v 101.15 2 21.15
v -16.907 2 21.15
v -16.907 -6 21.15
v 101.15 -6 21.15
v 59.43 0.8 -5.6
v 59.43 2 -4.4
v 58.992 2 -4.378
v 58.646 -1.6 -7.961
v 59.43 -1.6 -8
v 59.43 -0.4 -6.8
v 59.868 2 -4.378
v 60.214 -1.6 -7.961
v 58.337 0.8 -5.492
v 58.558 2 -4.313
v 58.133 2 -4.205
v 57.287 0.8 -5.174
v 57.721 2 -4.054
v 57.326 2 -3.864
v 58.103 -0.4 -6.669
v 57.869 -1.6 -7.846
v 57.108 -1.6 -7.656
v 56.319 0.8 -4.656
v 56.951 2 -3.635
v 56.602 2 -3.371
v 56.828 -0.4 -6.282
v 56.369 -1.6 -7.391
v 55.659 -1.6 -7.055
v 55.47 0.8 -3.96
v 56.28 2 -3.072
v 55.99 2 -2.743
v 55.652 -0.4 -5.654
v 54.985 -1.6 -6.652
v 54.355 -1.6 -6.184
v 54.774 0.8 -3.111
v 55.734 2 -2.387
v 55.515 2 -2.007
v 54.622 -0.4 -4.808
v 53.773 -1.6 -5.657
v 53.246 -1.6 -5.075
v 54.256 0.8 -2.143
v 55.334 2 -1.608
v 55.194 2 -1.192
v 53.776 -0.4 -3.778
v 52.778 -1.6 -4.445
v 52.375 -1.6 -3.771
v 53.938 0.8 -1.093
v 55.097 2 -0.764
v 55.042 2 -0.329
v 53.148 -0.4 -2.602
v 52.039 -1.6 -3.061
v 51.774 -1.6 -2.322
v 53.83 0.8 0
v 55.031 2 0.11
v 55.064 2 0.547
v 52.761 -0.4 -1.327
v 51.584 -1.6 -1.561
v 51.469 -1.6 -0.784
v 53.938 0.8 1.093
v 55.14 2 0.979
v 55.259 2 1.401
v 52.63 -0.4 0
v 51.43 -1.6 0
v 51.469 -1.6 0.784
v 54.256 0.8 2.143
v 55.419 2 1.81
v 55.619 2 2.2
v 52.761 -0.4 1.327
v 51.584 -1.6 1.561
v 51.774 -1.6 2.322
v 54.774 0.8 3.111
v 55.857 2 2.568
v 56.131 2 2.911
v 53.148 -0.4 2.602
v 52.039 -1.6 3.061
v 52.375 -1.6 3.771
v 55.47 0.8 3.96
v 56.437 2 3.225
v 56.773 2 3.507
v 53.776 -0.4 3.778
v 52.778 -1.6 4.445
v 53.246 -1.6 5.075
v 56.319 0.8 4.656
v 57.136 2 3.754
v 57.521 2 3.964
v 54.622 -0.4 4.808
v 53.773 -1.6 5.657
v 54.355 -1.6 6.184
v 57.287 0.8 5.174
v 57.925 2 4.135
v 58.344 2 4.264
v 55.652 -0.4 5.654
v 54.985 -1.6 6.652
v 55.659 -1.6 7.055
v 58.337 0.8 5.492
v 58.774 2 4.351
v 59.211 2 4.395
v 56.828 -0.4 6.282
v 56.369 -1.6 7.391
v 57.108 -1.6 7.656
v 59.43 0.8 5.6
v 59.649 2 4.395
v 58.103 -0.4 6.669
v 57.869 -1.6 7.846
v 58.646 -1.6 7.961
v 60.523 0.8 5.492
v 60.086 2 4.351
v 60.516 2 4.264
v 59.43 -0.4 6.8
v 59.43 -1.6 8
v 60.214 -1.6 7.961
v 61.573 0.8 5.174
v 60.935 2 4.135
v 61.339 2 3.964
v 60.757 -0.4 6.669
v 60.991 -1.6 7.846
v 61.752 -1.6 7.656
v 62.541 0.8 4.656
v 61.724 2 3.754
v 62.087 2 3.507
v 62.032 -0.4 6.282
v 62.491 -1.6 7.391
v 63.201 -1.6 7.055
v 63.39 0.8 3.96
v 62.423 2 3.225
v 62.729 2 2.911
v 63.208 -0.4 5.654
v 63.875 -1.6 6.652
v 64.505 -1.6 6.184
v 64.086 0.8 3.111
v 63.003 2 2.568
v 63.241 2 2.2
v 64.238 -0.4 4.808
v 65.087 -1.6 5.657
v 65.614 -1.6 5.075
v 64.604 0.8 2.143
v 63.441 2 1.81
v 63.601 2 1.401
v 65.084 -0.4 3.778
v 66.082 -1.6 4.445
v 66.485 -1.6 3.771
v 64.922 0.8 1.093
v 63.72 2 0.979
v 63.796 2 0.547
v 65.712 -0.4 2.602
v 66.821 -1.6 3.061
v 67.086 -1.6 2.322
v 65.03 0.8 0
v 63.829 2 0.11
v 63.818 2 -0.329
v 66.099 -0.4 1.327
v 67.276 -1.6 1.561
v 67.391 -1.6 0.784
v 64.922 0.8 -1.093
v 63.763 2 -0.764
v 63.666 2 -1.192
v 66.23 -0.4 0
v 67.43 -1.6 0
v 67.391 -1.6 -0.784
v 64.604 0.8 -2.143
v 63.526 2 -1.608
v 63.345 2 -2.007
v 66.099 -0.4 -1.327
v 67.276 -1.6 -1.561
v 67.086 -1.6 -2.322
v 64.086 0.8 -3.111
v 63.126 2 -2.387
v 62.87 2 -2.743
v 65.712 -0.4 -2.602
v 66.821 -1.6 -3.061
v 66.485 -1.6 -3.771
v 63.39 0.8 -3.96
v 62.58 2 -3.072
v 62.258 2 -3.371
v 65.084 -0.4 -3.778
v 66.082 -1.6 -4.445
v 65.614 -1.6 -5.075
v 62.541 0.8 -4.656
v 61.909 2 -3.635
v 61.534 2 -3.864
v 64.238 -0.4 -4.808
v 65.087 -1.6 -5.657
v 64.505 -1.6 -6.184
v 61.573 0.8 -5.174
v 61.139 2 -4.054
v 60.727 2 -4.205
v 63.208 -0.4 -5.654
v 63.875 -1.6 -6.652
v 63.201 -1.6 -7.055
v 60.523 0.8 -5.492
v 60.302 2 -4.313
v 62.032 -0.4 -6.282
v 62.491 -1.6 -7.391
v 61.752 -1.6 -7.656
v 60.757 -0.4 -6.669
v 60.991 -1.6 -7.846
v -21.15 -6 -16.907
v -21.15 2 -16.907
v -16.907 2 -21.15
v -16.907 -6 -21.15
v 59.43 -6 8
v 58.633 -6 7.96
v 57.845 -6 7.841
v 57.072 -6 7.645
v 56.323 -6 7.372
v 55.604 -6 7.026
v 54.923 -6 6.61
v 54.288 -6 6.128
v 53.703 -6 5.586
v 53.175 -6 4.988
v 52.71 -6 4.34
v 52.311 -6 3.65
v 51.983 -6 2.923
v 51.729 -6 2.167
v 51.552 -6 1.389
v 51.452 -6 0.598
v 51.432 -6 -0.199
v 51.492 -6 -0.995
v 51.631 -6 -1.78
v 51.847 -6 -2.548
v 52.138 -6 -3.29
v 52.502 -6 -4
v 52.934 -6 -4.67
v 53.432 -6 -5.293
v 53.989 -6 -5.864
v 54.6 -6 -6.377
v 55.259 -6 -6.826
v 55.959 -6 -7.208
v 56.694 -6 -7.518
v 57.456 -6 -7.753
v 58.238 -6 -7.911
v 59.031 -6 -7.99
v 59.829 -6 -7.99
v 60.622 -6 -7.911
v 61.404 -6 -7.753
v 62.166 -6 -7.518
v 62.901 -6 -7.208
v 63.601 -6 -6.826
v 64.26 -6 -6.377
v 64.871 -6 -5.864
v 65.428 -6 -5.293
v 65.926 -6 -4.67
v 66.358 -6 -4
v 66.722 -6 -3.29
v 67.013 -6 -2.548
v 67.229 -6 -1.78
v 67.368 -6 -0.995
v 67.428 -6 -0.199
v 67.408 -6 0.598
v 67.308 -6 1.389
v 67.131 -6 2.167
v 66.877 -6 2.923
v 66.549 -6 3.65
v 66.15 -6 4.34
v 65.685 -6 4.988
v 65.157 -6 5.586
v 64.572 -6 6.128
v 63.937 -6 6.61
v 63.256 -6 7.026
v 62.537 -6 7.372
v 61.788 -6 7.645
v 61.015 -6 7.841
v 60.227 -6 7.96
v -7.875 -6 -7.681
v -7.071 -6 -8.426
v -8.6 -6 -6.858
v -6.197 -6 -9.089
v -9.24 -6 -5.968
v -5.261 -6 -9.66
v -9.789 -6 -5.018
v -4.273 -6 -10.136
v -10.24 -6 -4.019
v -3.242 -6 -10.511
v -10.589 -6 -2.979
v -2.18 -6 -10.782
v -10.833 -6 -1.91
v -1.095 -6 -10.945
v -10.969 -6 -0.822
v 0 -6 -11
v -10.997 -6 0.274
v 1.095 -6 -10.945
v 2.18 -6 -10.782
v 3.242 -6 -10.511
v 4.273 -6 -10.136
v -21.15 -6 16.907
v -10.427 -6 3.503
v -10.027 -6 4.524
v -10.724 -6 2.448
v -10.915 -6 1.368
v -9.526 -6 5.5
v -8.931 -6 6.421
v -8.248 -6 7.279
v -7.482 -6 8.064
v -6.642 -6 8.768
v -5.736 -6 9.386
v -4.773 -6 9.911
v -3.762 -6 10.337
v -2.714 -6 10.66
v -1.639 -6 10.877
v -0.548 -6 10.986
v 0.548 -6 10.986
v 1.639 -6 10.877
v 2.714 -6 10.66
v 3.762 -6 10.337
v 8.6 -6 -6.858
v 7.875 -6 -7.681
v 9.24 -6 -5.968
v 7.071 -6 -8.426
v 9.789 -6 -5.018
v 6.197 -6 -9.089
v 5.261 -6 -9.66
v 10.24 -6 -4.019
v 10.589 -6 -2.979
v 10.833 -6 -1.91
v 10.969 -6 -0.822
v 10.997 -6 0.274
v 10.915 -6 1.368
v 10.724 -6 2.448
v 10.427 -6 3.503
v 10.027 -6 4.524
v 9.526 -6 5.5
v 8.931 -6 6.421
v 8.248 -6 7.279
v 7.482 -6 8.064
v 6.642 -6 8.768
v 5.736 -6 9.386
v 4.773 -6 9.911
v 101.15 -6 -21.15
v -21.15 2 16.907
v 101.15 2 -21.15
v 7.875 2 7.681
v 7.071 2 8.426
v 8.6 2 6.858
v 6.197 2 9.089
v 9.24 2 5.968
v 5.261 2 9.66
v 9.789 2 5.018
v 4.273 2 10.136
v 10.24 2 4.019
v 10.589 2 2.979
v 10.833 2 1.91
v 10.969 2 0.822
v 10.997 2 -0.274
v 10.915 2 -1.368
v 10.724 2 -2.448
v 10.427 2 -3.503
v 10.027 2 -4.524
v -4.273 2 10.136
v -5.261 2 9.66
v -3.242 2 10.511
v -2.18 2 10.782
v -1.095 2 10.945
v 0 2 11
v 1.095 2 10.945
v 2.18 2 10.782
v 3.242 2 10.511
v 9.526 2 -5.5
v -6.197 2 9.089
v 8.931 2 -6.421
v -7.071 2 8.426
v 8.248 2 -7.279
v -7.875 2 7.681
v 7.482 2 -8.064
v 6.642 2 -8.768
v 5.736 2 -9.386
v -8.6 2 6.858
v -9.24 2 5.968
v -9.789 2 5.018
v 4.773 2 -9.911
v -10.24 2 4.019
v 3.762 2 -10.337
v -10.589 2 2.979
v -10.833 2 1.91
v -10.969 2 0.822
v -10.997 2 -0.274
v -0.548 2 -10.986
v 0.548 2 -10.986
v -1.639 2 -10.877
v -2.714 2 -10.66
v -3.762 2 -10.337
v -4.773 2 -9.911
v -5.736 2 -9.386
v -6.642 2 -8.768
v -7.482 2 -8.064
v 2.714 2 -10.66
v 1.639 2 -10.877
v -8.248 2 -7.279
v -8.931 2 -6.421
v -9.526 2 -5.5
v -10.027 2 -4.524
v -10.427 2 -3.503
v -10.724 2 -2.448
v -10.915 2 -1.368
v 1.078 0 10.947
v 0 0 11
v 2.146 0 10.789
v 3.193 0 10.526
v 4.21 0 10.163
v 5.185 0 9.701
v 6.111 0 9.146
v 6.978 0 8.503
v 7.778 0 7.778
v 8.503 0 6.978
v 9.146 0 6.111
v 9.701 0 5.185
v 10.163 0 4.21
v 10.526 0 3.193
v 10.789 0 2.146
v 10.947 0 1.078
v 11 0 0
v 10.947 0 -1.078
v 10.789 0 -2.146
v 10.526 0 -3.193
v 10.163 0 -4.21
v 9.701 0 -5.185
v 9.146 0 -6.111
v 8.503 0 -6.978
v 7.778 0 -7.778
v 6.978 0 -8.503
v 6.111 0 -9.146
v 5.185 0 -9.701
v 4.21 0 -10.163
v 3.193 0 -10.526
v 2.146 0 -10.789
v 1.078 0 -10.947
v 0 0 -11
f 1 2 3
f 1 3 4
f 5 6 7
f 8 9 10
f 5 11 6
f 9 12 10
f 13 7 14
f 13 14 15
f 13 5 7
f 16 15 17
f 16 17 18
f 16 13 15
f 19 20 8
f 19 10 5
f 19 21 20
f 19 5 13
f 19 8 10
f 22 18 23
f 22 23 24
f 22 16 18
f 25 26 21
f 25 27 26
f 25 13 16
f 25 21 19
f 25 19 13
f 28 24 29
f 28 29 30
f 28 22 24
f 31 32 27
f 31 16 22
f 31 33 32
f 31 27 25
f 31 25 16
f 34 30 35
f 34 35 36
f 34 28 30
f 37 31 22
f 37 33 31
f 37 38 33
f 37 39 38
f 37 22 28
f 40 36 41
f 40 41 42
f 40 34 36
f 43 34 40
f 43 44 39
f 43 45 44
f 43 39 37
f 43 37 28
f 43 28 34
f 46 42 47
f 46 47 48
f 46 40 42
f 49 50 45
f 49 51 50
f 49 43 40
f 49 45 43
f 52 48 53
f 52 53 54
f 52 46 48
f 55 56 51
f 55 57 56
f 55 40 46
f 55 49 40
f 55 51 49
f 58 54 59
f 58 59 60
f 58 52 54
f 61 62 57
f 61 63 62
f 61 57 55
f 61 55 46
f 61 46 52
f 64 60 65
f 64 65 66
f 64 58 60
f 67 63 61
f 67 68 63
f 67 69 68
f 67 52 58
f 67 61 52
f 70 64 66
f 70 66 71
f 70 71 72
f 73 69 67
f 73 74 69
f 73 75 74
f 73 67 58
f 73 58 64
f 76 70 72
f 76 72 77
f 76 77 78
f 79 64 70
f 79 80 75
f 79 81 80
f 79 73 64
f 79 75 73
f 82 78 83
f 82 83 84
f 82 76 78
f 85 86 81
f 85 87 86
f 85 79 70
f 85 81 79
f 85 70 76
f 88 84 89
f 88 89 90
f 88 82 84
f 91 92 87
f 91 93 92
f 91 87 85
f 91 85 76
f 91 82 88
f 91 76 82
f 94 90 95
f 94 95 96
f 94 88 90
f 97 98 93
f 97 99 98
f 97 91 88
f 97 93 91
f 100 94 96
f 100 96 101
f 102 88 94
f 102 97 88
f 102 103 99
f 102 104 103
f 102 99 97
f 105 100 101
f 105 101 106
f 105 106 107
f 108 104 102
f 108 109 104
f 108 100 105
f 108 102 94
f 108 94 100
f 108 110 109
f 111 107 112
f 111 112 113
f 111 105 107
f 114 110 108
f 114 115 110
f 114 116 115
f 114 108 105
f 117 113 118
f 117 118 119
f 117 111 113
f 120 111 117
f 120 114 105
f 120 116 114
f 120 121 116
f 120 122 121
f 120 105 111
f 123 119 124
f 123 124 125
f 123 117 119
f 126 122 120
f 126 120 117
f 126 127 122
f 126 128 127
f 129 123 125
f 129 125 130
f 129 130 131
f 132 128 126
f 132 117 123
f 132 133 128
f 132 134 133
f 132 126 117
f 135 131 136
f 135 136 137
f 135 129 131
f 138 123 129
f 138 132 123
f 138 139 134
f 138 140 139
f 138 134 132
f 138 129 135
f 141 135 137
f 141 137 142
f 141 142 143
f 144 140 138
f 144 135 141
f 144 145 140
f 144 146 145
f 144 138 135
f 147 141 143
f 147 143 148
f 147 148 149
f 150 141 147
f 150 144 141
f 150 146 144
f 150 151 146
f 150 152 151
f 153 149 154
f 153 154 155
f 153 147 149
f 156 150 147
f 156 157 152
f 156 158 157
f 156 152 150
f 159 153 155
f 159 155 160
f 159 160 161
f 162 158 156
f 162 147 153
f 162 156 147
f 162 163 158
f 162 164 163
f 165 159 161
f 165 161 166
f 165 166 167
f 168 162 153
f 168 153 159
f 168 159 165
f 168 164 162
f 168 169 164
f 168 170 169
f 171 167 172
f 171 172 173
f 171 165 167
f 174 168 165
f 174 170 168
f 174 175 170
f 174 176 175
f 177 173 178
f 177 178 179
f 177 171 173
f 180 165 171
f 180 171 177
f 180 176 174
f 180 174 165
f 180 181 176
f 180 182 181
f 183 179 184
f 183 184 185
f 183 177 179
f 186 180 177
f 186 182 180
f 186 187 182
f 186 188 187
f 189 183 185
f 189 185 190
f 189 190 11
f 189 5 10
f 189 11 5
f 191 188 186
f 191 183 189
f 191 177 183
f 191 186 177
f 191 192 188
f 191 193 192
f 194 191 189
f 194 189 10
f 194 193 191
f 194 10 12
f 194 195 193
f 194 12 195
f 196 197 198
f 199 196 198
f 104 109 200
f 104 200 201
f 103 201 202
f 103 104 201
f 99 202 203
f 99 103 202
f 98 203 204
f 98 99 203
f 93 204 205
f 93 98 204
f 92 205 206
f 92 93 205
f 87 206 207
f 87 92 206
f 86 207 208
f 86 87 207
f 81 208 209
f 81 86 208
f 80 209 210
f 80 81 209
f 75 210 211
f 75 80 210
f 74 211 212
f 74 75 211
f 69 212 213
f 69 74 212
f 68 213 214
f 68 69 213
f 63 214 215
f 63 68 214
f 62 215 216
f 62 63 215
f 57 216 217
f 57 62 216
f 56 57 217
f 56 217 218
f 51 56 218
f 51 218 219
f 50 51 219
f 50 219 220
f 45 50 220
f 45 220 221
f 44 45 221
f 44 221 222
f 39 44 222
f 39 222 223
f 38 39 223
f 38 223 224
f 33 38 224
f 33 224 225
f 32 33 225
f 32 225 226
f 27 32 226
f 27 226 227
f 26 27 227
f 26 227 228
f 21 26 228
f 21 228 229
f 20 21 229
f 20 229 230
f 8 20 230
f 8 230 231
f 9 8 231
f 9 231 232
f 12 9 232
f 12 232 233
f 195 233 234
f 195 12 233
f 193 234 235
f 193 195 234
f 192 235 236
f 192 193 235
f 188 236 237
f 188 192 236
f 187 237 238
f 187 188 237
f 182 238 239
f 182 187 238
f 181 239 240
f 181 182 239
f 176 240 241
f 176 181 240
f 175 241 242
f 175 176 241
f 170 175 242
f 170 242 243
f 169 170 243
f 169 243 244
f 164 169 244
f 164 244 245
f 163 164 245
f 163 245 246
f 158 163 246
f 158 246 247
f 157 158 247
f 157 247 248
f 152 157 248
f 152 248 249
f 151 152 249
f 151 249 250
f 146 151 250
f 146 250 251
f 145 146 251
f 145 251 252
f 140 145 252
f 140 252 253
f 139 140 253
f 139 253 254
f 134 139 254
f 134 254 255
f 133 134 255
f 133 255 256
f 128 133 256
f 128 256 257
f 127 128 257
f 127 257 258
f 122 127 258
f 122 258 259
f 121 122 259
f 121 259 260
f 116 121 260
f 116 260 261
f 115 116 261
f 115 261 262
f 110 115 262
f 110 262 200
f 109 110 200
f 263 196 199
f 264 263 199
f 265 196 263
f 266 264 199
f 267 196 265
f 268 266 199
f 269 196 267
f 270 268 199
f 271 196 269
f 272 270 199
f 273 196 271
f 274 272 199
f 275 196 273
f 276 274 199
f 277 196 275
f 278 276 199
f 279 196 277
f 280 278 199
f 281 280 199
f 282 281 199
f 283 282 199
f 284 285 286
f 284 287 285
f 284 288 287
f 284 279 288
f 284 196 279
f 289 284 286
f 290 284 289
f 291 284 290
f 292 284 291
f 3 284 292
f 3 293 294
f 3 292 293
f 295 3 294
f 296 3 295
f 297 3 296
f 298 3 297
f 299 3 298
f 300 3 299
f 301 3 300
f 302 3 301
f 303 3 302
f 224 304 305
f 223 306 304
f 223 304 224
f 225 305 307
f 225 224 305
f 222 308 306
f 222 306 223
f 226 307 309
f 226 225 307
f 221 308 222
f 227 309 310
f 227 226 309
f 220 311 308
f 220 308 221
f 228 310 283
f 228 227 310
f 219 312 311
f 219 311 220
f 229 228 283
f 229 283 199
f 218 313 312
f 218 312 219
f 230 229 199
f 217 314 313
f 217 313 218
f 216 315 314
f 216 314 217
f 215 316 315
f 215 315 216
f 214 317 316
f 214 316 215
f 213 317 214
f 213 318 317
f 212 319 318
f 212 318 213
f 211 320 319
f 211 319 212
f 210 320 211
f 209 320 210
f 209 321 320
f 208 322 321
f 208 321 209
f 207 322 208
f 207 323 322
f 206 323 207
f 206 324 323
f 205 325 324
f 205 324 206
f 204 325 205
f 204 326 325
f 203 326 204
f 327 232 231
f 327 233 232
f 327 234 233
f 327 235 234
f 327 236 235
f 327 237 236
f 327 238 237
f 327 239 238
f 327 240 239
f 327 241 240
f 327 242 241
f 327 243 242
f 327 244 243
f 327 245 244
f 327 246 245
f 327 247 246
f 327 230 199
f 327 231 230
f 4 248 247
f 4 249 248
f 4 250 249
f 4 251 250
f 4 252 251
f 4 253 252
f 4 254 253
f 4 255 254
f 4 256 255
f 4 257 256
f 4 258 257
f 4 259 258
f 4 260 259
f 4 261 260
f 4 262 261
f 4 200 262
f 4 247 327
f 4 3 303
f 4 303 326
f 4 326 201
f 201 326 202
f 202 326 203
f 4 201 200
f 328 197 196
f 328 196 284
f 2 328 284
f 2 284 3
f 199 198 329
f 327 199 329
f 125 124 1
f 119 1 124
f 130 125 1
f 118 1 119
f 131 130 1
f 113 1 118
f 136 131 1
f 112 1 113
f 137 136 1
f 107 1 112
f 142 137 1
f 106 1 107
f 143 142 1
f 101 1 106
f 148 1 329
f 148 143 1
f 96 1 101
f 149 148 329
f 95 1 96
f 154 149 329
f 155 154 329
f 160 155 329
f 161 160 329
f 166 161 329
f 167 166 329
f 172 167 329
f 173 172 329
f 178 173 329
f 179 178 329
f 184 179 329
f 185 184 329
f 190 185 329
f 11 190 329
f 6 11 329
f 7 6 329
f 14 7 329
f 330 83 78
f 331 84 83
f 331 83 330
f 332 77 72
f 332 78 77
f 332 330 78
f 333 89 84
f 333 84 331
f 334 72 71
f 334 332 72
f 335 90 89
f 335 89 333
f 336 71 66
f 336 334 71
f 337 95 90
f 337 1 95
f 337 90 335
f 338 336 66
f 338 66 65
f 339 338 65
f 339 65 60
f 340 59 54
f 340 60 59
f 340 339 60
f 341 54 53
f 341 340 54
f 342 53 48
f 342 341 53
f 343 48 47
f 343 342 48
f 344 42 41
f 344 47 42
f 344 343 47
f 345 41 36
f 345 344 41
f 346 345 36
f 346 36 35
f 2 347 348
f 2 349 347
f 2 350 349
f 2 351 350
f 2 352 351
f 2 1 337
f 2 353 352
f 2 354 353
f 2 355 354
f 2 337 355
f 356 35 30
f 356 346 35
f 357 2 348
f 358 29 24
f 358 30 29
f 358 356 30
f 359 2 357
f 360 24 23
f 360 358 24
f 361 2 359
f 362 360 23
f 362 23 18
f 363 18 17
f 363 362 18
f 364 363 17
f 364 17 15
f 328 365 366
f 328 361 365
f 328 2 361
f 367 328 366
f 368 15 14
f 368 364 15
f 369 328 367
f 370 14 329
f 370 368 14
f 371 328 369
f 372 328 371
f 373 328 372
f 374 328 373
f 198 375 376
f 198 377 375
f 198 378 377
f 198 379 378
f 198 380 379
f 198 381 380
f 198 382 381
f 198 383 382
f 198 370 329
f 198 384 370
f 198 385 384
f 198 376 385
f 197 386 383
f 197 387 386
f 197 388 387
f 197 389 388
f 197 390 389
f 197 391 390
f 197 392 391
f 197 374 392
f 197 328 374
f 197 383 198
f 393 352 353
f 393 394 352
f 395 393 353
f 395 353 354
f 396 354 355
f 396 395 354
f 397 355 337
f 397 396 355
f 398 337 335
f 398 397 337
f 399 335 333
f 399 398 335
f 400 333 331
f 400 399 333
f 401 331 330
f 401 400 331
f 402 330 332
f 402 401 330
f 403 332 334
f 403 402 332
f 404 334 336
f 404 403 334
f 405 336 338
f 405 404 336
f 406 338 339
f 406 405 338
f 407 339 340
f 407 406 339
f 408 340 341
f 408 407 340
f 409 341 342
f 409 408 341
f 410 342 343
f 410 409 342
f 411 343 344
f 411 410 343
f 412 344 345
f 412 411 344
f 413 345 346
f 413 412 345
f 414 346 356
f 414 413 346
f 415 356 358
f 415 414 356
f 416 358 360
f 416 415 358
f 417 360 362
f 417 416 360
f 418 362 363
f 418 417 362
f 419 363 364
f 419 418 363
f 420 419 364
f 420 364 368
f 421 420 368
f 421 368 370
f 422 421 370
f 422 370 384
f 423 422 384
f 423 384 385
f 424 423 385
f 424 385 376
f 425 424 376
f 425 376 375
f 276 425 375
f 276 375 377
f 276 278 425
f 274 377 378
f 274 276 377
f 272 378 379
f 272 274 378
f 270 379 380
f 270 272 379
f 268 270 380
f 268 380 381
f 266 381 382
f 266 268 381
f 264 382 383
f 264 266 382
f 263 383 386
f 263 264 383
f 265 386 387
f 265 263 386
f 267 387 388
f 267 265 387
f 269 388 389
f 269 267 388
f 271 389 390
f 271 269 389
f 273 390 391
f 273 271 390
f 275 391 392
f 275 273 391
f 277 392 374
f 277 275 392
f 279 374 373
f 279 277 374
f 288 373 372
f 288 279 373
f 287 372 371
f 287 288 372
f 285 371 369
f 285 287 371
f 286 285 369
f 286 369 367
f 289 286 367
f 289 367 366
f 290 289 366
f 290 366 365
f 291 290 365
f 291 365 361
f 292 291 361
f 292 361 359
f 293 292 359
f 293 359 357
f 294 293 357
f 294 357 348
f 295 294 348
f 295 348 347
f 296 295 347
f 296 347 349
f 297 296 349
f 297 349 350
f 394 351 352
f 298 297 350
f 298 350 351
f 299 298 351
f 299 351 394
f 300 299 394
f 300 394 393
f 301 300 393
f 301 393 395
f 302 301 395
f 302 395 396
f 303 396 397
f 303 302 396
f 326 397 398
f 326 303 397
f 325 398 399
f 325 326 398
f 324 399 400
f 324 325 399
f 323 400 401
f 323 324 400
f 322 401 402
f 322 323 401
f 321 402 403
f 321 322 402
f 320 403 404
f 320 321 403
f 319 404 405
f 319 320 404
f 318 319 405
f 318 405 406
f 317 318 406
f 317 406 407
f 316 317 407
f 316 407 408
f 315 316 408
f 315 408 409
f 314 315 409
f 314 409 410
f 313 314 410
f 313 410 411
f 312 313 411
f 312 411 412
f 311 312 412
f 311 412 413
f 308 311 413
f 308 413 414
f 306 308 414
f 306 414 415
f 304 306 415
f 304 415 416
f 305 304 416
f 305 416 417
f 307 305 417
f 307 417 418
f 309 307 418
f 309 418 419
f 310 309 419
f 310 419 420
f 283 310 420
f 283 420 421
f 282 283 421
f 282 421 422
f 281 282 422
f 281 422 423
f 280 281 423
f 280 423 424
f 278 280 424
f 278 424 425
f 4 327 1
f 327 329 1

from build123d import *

# Parameters (mm, degrees)
SKETCH1_W           = 42.3
SKETCH1_H           = 42.3
SKETCH1_R           = 11
BOSS_EXTRUDE1_DEPTH = 2
SKETCH2_W           = 80
SKETCH2_H           = 42.3
SKETCH2_R           = 8
BOSS_EXTRUDE2_DEPTH = 2
SKETCH3_W           = 122.3
SKETCH3_H           = 42.3
SKETCH3_R           = 8
SKETCH3_R_2         = 11
BOSS_EXTRUDE3_DEPTH = 6
CUT_EXTRUDE1_DEPTH  = 8


with BuildPart() as part:
    # Sketch1 → Boss-Extrude1 (new body)
    with BuildSketch(Plane(origin=(0, 0, 0), x_dir=(1, 0, 0), z_dir=(0, 1, 0))):
        Rectangle(SKETCH1_W, SKETCH1_H)
        with Locations(Location((0, 0, 0), (0, 0, 270))):
            Circle(SKETCH1_R, mode=Mode.SUBTRACT)
    extrude(amount=BOSS_EXTRUDE1_DEPTH)

    # Sketch2 → Boss-Extrude2 (add)
    with BuildSketch(Plane(origin=(0, 2, 0), x_dir=(1, 0, 0), z_dir=(0, 1, 0))):
        with Locations((61.15, 0)):
            Rectangle(SKETCH2_W, SKETCH2_H)
        with Locations(Location((59.43, 0, 0), (0, 0, 270))):
            Circle(SKETCH2_R, mode=Mode.SUBTRACT)
    extrude(amount=-BOSS_EXTRUDE2_DEPTH)

    # Sketch3 → Boss-Extrude3 (add)
    with BuildSketch(Plane.XZ):
        with Locations((40, 0)):
            Rectangle(SKETCH3_W, SKETCH3_H)
        with Locations(Location((59.43, 0, 0), (0, 0, 90))):
            Circle(SKETCH3_R, mode=Mode.SUBTRACT)
        with Locations(Location((0, 0, 0), (0, 0, 270))):
            Circle(SKETCH3_R_2, mode=Mode.SUBTRACT)
    extrude(amount=BOSS_EXTRUDE3_DEPTH)

    # Sketch5 → Revolve1 (revolve)
    with BuildSketch(Plane.XY, mode=Mode.PRIVATE) as revolve1_sk:
        Polygon((67.43, 2), (63.83, 2), (67.43, -1.6), align=None)
    revolve(revolve1_sk.sketch.rotate(Axis((59.43, 0, 0), (0, 1, 0)), 90), axis=Axis((59.43, 0, 0), (0, 1, 0)))

    # Sketch6 → Cut-Extrude1 (cut)
    with BuildSketch(Plane(origin=(0, 2, 0), x_dir=(1, 0, 0), z_dir=(0, 1, 0))):
        Polygon((-21.15, 16.907359313), (-16.907359313, 21.15), (-21.15, 21.15), align=None)
        Polygon((-21.15, -21.15), (-21.15, -16.907359313), (-16.907359313, -21.15), align=None)
    extrude(amount=-CUT_EXTRUDE1_DEPTH, mode=Mode.SUBTRACT)


solid = part.part
